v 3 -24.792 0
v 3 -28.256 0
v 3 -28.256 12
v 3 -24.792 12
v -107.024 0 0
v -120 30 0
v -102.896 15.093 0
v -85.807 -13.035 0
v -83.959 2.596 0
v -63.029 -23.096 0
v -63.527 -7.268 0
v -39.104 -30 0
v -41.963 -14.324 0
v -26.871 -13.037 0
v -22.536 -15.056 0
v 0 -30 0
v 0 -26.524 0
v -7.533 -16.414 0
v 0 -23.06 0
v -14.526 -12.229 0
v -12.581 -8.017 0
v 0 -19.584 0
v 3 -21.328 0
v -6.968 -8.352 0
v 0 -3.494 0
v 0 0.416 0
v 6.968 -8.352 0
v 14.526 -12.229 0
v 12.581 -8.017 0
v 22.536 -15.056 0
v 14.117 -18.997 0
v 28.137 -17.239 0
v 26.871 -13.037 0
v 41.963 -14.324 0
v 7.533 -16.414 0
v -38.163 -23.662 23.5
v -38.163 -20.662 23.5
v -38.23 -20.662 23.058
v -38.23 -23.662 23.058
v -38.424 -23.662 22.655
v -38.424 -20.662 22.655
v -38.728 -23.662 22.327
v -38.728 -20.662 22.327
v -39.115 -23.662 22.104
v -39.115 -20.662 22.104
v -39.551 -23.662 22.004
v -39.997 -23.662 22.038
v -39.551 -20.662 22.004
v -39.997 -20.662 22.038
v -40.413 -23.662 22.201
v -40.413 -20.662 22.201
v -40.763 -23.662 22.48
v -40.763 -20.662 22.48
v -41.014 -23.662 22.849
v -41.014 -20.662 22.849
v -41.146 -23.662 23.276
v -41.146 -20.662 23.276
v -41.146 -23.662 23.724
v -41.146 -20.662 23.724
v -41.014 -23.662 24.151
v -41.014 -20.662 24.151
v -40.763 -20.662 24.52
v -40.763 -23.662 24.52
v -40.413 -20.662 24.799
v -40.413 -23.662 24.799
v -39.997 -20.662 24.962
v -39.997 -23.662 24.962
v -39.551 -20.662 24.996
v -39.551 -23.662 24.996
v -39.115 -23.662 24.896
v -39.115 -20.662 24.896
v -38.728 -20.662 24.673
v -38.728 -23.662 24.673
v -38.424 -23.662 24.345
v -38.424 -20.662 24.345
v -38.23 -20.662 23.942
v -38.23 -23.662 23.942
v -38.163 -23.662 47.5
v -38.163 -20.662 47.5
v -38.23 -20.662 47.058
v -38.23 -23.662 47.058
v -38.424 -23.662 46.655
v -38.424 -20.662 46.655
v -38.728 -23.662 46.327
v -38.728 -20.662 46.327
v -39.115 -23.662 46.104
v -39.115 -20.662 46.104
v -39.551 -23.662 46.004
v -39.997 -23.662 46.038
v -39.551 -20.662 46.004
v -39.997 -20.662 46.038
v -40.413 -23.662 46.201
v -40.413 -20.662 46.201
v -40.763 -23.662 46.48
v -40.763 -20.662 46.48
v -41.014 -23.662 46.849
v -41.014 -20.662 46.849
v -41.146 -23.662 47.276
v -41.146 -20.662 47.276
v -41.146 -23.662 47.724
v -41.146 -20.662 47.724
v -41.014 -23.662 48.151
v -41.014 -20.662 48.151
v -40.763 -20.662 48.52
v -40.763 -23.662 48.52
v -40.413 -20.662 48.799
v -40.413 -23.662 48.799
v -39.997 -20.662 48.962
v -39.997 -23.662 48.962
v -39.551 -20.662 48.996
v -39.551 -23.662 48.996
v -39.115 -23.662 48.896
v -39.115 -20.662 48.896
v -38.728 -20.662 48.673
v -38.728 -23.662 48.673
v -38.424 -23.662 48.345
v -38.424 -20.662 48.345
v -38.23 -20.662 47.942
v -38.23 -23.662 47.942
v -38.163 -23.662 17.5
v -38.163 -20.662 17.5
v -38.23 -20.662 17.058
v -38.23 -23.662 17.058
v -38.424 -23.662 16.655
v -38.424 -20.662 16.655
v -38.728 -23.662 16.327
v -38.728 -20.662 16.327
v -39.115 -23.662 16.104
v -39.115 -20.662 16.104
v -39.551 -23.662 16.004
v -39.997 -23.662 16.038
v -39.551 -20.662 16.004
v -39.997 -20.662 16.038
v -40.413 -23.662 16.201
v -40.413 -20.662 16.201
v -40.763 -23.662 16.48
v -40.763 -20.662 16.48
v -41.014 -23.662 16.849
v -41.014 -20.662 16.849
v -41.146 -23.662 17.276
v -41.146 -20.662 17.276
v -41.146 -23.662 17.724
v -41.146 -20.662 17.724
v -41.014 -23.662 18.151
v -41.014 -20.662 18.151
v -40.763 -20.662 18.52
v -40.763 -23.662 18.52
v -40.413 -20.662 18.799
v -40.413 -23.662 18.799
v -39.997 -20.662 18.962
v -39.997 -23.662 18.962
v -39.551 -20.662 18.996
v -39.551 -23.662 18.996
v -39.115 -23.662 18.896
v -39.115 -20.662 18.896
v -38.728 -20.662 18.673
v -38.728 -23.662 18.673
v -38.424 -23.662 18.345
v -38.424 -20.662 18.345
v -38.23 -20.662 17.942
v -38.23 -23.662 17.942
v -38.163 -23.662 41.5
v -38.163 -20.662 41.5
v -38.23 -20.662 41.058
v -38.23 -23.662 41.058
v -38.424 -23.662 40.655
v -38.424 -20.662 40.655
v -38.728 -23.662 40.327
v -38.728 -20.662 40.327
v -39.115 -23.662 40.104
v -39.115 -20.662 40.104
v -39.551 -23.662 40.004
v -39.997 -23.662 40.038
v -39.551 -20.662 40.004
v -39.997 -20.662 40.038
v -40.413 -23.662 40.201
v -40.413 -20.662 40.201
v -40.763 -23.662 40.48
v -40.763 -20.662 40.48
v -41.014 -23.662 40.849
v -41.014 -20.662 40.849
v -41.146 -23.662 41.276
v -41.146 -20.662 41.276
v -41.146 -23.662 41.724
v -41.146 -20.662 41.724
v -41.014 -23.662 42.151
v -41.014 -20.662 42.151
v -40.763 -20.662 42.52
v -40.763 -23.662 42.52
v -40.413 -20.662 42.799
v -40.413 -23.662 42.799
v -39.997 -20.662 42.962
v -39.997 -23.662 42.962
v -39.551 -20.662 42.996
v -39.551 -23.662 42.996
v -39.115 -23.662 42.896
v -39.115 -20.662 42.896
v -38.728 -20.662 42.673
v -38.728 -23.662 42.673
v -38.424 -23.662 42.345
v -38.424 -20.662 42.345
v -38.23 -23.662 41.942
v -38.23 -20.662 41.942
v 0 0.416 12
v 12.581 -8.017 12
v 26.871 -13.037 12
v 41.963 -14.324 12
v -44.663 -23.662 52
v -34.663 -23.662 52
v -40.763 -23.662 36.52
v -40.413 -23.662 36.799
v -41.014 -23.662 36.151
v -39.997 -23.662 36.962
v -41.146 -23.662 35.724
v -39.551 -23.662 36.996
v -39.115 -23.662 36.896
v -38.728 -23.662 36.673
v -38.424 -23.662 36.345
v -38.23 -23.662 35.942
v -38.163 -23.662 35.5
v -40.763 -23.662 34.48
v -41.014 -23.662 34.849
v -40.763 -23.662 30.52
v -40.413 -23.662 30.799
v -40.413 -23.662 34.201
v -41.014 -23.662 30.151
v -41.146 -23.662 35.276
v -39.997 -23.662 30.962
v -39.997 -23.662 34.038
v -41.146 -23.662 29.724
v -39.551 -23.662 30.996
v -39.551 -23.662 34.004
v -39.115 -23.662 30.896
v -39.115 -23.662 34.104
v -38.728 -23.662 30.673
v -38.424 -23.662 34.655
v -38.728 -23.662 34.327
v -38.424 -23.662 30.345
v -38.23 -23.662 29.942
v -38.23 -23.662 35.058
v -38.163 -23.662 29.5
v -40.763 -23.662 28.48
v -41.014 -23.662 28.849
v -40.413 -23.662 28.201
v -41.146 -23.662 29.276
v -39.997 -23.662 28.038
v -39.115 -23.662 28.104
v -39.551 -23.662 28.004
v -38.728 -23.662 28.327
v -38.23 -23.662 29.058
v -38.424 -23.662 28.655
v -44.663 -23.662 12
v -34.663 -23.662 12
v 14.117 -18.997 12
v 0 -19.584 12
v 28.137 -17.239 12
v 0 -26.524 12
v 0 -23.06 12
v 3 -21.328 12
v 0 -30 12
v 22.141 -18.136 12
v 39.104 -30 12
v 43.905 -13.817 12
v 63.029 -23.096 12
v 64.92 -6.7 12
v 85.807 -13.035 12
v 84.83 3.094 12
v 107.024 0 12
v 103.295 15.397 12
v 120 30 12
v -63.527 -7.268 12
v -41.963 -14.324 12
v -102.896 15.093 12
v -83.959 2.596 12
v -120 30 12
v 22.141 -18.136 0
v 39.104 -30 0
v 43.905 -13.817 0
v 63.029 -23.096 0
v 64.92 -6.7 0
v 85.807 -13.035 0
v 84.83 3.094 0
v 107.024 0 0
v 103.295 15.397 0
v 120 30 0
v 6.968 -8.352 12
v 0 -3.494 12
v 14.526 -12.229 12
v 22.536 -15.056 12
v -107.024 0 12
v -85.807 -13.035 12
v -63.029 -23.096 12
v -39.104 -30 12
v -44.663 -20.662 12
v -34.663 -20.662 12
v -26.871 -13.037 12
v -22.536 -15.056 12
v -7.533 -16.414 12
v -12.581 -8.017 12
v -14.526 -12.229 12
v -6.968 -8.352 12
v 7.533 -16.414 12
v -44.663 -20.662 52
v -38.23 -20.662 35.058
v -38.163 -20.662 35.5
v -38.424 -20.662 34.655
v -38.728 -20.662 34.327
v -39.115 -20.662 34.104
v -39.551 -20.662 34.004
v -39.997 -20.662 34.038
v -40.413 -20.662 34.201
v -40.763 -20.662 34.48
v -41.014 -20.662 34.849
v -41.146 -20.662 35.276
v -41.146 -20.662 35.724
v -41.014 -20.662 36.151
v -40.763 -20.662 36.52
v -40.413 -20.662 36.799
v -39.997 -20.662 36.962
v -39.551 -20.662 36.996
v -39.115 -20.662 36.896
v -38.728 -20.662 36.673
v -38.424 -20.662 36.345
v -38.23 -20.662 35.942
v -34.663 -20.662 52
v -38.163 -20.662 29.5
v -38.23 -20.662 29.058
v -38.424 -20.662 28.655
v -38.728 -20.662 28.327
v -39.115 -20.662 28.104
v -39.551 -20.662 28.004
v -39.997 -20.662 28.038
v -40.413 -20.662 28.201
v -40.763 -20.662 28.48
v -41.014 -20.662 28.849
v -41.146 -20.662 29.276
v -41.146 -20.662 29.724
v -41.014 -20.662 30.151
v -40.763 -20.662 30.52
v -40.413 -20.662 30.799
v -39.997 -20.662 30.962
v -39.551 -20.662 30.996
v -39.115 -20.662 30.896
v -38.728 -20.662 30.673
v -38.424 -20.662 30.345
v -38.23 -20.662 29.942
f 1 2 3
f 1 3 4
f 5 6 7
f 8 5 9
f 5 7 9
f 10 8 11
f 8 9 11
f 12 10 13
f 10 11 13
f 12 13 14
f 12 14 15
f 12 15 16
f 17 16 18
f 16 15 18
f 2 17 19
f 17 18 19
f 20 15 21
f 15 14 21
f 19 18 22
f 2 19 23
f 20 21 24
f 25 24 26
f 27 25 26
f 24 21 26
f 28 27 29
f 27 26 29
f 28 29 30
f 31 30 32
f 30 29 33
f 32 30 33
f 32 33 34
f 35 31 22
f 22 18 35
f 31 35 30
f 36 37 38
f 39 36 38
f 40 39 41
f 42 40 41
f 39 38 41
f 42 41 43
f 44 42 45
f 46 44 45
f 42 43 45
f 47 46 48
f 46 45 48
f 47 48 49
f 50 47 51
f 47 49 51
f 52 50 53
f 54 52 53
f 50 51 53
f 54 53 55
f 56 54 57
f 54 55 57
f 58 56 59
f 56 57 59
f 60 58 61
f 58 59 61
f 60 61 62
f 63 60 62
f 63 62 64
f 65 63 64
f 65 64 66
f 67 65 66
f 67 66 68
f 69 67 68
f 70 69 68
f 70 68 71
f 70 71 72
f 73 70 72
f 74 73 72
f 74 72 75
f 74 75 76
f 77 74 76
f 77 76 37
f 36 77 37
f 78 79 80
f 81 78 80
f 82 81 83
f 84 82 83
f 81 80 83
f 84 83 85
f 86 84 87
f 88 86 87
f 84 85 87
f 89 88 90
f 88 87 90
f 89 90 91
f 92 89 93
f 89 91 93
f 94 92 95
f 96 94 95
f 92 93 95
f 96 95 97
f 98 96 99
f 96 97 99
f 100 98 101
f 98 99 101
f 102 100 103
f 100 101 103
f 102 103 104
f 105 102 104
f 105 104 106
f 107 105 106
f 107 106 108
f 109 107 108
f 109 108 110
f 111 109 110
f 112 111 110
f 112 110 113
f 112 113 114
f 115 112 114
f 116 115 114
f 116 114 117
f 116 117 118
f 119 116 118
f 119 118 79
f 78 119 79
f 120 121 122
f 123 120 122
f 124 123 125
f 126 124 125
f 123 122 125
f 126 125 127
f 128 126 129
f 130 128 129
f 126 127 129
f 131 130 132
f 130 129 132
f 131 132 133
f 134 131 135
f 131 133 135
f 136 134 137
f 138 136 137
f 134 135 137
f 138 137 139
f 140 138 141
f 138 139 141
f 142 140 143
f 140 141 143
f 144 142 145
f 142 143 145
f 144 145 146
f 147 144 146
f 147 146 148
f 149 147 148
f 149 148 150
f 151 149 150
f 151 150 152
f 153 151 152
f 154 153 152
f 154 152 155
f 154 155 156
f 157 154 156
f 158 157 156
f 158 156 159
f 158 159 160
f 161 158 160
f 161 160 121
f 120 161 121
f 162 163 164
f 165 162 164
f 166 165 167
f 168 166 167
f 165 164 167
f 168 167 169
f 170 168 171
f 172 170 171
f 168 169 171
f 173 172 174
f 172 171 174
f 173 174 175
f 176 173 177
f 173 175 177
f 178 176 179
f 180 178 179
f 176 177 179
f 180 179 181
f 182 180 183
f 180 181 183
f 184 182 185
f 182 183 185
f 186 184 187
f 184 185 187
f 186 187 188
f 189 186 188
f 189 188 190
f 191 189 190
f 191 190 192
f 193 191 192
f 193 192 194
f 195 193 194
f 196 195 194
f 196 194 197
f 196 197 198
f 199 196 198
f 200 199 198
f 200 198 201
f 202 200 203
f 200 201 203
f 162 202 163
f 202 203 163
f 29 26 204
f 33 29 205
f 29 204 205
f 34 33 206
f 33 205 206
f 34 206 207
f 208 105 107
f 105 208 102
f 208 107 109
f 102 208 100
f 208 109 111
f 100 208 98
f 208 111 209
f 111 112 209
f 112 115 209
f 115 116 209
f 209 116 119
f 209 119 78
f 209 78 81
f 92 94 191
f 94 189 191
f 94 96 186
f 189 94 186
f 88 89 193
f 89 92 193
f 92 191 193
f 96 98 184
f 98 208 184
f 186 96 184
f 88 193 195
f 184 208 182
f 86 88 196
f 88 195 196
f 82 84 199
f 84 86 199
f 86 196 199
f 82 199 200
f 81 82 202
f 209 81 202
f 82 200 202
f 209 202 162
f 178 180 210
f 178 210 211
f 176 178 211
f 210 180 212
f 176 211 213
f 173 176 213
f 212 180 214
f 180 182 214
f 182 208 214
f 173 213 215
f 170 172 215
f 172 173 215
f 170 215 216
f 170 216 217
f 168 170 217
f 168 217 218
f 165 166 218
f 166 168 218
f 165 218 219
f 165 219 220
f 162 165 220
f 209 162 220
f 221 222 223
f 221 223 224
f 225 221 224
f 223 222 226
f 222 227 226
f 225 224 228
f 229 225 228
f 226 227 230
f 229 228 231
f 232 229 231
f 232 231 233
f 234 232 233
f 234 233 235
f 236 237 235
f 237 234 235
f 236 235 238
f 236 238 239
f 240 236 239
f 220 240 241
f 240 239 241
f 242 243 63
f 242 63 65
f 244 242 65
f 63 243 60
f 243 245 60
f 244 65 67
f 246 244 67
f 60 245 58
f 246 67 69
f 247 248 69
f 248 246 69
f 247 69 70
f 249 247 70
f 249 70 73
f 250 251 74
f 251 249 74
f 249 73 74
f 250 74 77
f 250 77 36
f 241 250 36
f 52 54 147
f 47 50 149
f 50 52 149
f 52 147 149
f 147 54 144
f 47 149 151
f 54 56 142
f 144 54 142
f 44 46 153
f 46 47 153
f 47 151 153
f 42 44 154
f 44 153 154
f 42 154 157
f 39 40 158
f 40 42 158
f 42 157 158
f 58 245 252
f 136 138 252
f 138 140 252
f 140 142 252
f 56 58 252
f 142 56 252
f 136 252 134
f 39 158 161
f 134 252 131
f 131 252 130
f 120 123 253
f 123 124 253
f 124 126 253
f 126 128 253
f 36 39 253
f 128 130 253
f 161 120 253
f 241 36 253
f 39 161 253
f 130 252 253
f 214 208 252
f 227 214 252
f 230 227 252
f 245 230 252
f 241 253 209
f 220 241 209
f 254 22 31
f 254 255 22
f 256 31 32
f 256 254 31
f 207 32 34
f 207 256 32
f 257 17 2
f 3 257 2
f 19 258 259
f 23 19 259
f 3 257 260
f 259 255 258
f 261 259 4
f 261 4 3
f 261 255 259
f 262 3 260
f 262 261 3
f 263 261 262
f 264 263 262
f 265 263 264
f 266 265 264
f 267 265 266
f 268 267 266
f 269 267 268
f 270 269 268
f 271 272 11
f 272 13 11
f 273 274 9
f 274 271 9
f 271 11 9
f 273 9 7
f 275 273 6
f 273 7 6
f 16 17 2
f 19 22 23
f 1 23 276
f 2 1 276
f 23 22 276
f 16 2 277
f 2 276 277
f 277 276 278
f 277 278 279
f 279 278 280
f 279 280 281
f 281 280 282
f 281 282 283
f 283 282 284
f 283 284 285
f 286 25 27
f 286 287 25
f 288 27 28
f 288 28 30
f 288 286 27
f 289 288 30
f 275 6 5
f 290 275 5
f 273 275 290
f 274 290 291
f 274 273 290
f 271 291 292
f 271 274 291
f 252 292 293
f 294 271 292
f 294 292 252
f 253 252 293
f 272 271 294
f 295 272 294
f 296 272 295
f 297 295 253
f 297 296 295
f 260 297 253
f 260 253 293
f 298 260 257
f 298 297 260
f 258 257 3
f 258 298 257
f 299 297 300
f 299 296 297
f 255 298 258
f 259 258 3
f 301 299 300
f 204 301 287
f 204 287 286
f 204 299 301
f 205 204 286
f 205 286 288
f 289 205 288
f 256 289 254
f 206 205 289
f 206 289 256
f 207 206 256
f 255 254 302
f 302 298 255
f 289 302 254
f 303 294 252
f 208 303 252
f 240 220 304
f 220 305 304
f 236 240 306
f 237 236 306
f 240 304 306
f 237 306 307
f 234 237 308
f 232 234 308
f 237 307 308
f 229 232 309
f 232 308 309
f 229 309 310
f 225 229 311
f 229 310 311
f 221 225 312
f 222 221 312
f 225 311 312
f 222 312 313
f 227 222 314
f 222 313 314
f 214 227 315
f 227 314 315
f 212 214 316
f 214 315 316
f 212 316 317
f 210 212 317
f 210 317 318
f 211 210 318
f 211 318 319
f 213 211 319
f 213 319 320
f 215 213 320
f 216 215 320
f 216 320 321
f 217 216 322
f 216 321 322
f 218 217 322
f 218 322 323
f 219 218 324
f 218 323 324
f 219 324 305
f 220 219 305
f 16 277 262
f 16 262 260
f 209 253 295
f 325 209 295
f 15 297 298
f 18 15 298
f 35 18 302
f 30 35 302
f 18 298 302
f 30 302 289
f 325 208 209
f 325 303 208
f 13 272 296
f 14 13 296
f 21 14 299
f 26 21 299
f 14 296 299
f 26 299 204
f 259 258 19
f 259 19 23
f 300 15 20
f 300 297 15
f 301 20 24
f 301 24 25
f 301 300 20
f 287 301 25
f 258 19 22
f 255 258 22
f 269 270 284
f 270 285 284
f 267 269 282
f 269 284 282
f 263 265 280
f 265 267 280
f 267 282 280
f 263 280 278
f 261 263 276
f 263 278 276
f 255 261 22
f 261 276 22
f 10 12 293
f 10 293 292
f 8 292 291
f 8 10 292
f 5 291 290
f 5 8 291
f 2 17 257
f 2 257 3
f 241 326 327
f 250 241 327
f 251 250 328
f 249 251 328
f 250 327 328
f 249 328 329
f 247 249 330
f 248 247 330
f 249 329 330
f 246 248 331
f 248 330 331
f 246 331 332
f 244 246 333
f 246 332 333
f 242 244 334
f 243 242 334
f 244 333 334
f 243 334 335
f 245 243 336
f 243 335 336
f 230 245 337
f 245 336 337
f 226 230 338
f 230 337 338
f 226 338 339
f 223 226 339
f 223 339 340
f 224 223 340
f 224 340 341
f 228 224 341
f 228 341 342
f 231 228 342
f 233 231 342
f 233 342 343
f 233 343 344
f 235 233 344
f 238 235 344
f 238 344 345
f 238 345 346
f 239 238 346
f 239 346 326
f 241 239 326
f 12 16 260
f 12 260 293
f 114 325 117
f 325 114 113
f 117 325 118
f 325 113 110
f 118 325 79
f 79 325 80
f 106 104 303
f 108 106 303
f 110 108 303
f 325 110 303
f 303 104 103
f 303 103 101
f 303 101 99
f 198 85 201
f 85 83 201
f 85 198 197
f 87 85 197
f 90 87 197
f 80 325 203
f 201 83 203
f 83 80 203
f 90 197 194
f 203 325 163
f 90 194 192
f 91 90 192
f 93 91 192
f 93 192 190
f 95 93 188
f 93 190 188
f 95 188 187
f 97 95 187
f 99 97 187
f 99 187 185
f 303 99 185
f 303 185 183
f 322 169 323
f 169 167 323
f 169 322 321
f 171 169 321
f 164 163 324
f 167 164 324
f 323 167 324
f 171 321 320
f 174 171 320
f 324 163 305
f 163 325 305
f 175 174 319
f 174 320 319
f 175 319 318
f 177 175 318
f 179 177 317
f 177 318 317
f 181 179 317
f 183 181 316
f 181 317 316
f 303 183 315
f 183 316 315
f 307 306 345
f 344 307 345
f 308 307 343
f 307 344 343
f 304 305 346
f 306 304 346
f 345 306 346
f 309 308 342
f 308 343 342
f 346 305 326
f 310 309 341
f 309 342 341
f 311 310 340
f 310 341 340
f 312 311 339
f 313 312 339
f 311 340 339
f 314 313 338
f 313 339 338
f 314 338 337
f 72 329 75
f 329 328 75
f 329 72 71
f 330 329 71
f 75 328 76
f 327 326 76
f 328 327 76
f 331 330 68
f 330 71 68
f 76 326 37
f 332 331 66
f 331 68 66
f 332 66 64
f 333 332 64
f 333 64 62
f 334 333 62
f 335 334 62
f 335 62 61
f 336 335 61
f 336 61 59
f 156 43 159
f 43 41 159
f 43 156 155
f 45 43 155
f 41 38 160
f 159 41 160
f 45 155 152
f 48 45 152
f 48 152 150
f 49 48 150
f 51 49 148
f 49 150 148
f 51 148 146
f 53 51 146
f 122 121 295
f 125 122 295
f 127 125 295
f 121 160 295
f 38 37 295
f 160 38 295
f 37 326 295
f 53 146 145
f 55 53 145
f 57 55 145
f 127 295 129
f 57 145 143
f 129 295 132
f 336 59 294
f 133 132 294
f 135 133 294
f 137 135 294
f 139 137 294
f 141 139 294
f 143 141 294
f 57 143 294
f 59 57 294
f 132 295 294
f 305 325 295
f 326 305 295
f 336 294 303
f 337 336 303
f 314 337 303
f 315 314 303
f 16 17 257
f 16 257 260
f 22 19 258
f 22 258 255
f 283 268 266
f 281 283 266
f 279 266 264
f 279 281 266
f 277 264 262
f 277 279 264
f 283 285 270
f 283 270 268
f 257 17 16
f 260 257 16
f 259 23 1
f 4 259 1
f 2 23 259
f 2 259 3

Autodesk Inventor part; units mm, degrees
sketch "Эскиз1" plane through (0, 0, 0) normal (0, 0, 1) x (1, 0, 0)
  line L0 (39.103634, -30) -> (-39.103634, -30)
  line L1 (-120, 30) -> (120, -30) construction
  line L2 (120, 30) -> (-120, -30) construction
  line L3 (0, -30) -> (0, -27) construction
  arc A0 (-120, 30) -> (120, 30) centre (0, 150.415946) ccw
  arc A1 (-107.0236, 0) -> (-39.103634, -30) centre (0, 150.415946) ccw
  arc A2 (39.103634, -30) -> (107.0236, 0) centre (0, 150.415946) ccw
  line L4 (120, 30) -> (107.0236, 0)
  line L5 (-120, 30) -> (-107.0236, 0)
  point P0 (0, 0)
  dimension "d0" = 240
  dimension "d1" = 60
  dimension "d6" = 3
  dimension "d7" = 170
extrude "Выдавливание1" add sketch "Эскиз1" along normal blind 12
sketch "Эскиз2" plane through (0, 0, 12) normal (0, 0, 1) x (1, 0, 0)
  line L0 (-39.103634, -30) -> (39.103634, -30)
  line L1 (-39.103634, -30) -> (39.103634, -30) construction
  line L2 (0, -30) -> (10, -30) construction
  line L3 (0, -30) -> (-10, -30) construction
  arc A0 (-120, 30) -> (120, 30) centre (0, 150.415946) ccw
  line L4 (-120, 30) -> (-107.0236, 0)
  arc A1 (-107.0236, 0) -> (-39.103634, -30) centre (0, 150.415946) ccw
  arc A2 (39.103634, -30) -> (107.0236, 0) centre (0, 150.415946) ccw
  line L5 (107.0236, 0) -> (120, 30)
  point P0 (0, 0)
  point P1 (-12, -3)
  point P2 (12, -3)
  dimension "d4" = 10
  dimension "d5" = 10
sketch "Эскиз3" plane through (0, 0, 12) normal (0, 0, 1) x (1, 0, 0)
  line L0 (-39.103634, -30) -> (39.103634, -30) construction
  line L1 (0, -30) -> (0, -19.584054) construction
  arc A0 (-120, 30) -> (120, 30) centre (0, 150.415946) ccw construction
  line L2 (0, -24.792027) -> (-58.147862, -24.792027) construction
  arc A1 (-107.0236, 0) -> (-39.103634, -30) centre (0, 150.415946) ccw construction
  arc A2 (39.103634, -30) -> (107.0236, 0) centre (0, 150.415946) ccw construction
  line L3 (58.147862, -24.792027) -> (0, -24.792027) construction
  line L4 (0, -24.792027) -> (0, -27.792027)
  line L5 (0, -27.792027) -> (0, -21.792027)
  line L6 (0, -24.792027) -> (6, -24.792027) construction
  line L7 (0, -26.524078) -> (3, -28.256129)
  line L8 (0, -24.792027) -> (6.928203, -24.792027) construction
  line L9 (3, -28.256129) -> (3, -24.792027)
  line L10 (0, -23.059976) -> (3, -21.327925)
  line L11 (0, -24.792027) -> (6.928203, -24.792027) construction
  line L12 (3, -21.327925) -> (3, -24.792027)
  line L13 (0, -24.792027) -> (-3, -24.792027) construction
  line L14 (0, -23.059976) -> (0, -19.584054)
  line L15 (0, -26.524078) -> (0, -30)
  point P0 (0, 0)
  dimension "d8" = 3
  dimension "d9" = 6
  dimension "d10" = 6
  dimension "d11" = 30
  dimension "d12" = 30
  dimension "d13" = 3
sketch "Эскиз4" plane through (0, 0, 0) normal (0, 0, -1) x (-1, 0, 0)
  line L0 (-3, -28.256129) -> (-3, -24.792027)
  line L1 (0, -26.524078) -> (-3, -28.256129)
  line L2 (-3, -21.327925) -> (-3, -24.792027)
  line L3 (0, -23.059976) -> (-3, -21.327925)
  line L4 (0, -24.792027) -> (0, -27.792027)
  line L5 (0, -27.792027) -> (0, -21.792027)
  point P0 (0, 0)
ref_plane "РабПлоскость1" through (3, -21.327925, 12) normal (0.5, -0.8660254, 0) x (-0.8660254, -0.5, 0)
ref_plane "РабПлоскость2" through (3, -21.327925, 0) normal (-1, 0, 0) x (0, -1, 0)
ref_plane "РабПлоскость3" through (0, -26.524078, 12) normal (0.5, 0.8660254, 0) x (0.8660254, -0.5, 0)
ref_plane "РабПлоскость4" through (0, -19.584054, 12) normal (1, 0, 0) x (0, -1, 0)
ref_plane "РабПлоскость5" through (0, -26.524078, 0) normal (-1, 0, 0) x (0, -1, 0)
split body "Разделение1" sketch "Эскиз3" result two bodies curves L15 L7 L9 L12 L10 L14 first body at (-18.576653, -26.256352, 0.5)
sketch "Эскиз5" plane through (0, 0, 12) normal (0, 0, 1) x (1, 0, 0)
  line L0 (0, -19.584054) -> (0, -23.059976)
  arc A0 (-120, 30) -> (0, -19.584054) centre (0, 150.415946) ccw
  line L1 (-120, 30) -> (-107.0236, 0)
  arc A1 (-107.0236, 0) -> (-39.103634, -30) centre (0, 150.415946) ccw
  line L2 (-39.103634, -30) -> (0, -30)
  line L3 (0, -26.524078) -> (0, -30)
  line L4 (3, -28.256129) -> (0, -26.524078)
  line L5 (3, -21.327925) -> (3, -28.256129)
  line L6 (0, -23.059976) -> (3, -21.327925)
  line L7 (39.103634, -30) -> (0, -30)
  line L8 (0, -19.584054) -> (0, -23.059976)
  line L9 (0, -23.059976) -> (3, -21.327925)
  line L10 (3, -21.327925) -> (3, -28.256129)
  line L11 (3, -28.256129) -> (0, -26.524078)
  line L12 (0, -26.524078) -> (0, -30)
  line L13 (0, -30) -> (39.103634, -30)
  arc A2 (39.103634, -30) -> (107.0236, 0) centre (0, 150.415946) ccw
  line L14 (107.0236, 0) -> (120, 30)
  arc A3 (0, -19.584054) -> (120, 30) centre (0, 150.415946) ccw
  arc A4 (0, -19.584054) -> (120, 30) centre (0, 150.415946) ccw construction
  line L15 (0, -19.584054) -> (0, 0.415946) construction
  arc A5 (0, -19.584054) -> (120, 30) centre (0, 150.415946) ccw
  arc A6 (0, 0.415946) -> (41.962718, -14.323637) centre (39.482655, 45.718245) ccw
  arc A7 (-41.962718, -14.323637) -> (0, 0.415946) centre (-39.482655, 45.718245) ccw
  arc A8 (-41.962718, -14.323637) -> (41.962718, -14.323637) centre (0, 150.415946) ccw
  arc A9 (0, -3.494119) -> (22.536422, -15.056438) centre (39.482655, 45.718245) ccw
  arc A10 (-22.536422, -15.056438) -> (22.536422, -15.056438) centre (0, 150.415946) ccw
  arc A11 (-22.536422, -15.056438) -> (0, -3.494119) centre (-39.482655, 45.718245) ccw
  point P0 (0, 0)
  dimension "d15" = 20
  dimension "d18" = 3
extrude "Выдавливание2" add sketch "Эскиз5" against normal up to surface (12 mm away) contours A0 A7 A6 A3 bodies 2
sketch "Эскиз6" plane through (0, 0, 12) normal (0, 0, 1) x (1, 0, 0)
  arc A0 (-22.536422, -15.056438) -> (0, -3.494119) centre (-39.482655, 45.718245) ccw construction
  arc A1 (0, -3.494119) -> (22.536422, -15.056438) centre (39.482655, 45.718245) ccw construction
  arc A2 (-22.536422, -15.056438) -> (22.536422, -15.056438) centre (0, 150.415946) ccw construction
  line L0 (0, -19.584054) -> (0, -23.059976) construction
  arc A3 (0, -19.584054) -> (41.962718, -14.323637) centre (0, 150.415946) ccw construction
  arc A4 (0, 0.415946) -> (41.962718, -14.323637) centre (39.482655, 45.718245) ccw construction
  arc A5 (-41.962718, -14.323637) -> (0, 0.415946) centre (-39.482655, 45.718245) ccw construction
  arc A6 (-120, 30) -> (-41.962718, -14.323637) centre (0, 150.415946) ccw construction
  line L1 (-120, 30) -> (-107.0236, 0) construction
  arc A7 (-107.0236, 0) -> (-39.103634, -30) centre (0, 150.415946) ccw construction
  line L2 (-39.103634, -30) -> (0, -30) construction
  line L3 (0, -26.524078) -> (0, -30) construction
  line L4 (3, -28.256129) -> (0, -26.524078) construction
  line L5 (3, -21.327925) -> (3, -28.256129) construction
  line L6 (0, -23.059976) -> (3, -21.327925) construction
  line L7 (0, -19.584054) -> (0, -23.059976) construction
  line L8 (0, -23.059976) -> (3, -21.327925) construction
  line L9 (3, -21.327925) -> (3, -28.256129) construction
  line L10 (3, -28.256129) -> (0, -26.524078) construction
  line L11 (0, -26.524078) -> (0, -30) construction
  line L12 (0, -30) -> (39.103634, -30) construction
  arc A8 (39.103634, -30) -> (107.0236, 0) centre (0, 150.415946) ccw construction
  line L13 (107.0236, 0) -> (120, 30) construction
  arc A9 (0, -19.584054) -> (120, 30) centre (0, 150.415946) ccw construction
  line L14 (107.0236, 0) -> (-107.0236, 0) construction
  line L15 (0, -30) -> (-100, -30) construction
  line L16 (0, -30) -> (100, -30) construction
  line L17 (100, -30) -> (-34.663, -30) construction
  line L18 (-100, -30) -> (-44.663, -30) construction
  line L19 (-34.663, -30) -> (-44.663, -30) construction
  line L20 (-34.663, -31.5) -> (-44.663, -31.5) construction
  line L21 (-44.663, -31.5) -> (-44.663, -28.5) construction
  line L22 (-44.663, -28.5) -> (-34.663, -28.5) construction
  line L23 (-34.663, -28.5) -> (-34.663, -31.5) construction
  line L24 (-34.663, -31.5) -> (-44.663, -28.5) construction
  line L25 (-44.663, -31.5) -> (-34.663, -28.5) construction
  line L26 (-34.663, -30) -> (-34.663, -14.323637) construction
  line L27 (-44.663, -30) -> (-44.663, -13.612151) construction
  line L28 (-34.663, -22.161819) -> (-44.663, -22.161819) construction
  line L29 (-34.663, -20.661819) -> (-44.663, -20.661819)
  line L30 (-44.663, -20.661819) -> (-44.663, -23.661819)
  line L31 (-44.663, -23.661819) -> (-34.663, -23.661819)
  line L32 (-34.663, -23.661819) -> (-34.663, -20.661819)
  line L33 (-34.663, -20.661819) -> (-44.663, -23.661819) construction
  line L34 (-44.663, -20.661819) -> (-34.663, -23.661819) construction
  point P0 (0, 0)
  point P1 (-39.663, -30)
  point P2 (-39.663, -22.161819)
  dimension "d19" = 100
  dimension "d20" = 100
  dimension "d21" = 134.663
  dimension "d22" = 55.337
  dimension "d23" = 3
  dimension "d24" = 3
extrude "Выдавливание3" add sketch "Эскиз6" along normal blind 40 bodies 2
sketch "Эскиз7" plane through (-44.663, -20.661819, 12) normal (0, 1, 0) x (1, 0, 0)
  line L0 (0, 0) -> (10, 0) projected
  line L1 (0, 0) -> (0, -40) projected
  line L2 (10, -40) -> (0, -40) projected
  line L3 (10, 0) -> (10, -40) projected
  line L4 (0, 0) -> (0, -5.5) construction
  line L5 (0, 0) -> (0, -40) construction
  line L6 (0, -5.5) -> (10, -5.5) construction
  line L7 (5, -40) -> (5, 0) construction
  line L8 (0, 0) -> (10, 0) construction
  circle A0 centre (5, -5.5) radius 1.5
  line L9 (5, -5.5) -> (5, -11.5) construction
  circle A1 centre (5, -11.5) radius 1.5
  circle A2 centre (5, -17.5) radius 1.5
  circle A3 centre (5, -23.5) radius 1.5
  circle A4 centre (5, -29.5) radius 1.5
  circle A5 centre (5, -35.5) radius 1.5
  point P0 (44.663, 12)
  dimension "d27" = 5.5
  dimension "d28" = 3
  dimension "d29" = 6
  dimension "d30" = 3
  dimension "d38" = 6
  dimension "d45" = 6
extrude "Выдавливание4" cut sketch "Эскиз7" against normal blind 6 contours A0 | A1 | A2 | A3 | A4 | A5 bodies 2
equation "\"d31\" = d38"
properties part number "Kick male"
